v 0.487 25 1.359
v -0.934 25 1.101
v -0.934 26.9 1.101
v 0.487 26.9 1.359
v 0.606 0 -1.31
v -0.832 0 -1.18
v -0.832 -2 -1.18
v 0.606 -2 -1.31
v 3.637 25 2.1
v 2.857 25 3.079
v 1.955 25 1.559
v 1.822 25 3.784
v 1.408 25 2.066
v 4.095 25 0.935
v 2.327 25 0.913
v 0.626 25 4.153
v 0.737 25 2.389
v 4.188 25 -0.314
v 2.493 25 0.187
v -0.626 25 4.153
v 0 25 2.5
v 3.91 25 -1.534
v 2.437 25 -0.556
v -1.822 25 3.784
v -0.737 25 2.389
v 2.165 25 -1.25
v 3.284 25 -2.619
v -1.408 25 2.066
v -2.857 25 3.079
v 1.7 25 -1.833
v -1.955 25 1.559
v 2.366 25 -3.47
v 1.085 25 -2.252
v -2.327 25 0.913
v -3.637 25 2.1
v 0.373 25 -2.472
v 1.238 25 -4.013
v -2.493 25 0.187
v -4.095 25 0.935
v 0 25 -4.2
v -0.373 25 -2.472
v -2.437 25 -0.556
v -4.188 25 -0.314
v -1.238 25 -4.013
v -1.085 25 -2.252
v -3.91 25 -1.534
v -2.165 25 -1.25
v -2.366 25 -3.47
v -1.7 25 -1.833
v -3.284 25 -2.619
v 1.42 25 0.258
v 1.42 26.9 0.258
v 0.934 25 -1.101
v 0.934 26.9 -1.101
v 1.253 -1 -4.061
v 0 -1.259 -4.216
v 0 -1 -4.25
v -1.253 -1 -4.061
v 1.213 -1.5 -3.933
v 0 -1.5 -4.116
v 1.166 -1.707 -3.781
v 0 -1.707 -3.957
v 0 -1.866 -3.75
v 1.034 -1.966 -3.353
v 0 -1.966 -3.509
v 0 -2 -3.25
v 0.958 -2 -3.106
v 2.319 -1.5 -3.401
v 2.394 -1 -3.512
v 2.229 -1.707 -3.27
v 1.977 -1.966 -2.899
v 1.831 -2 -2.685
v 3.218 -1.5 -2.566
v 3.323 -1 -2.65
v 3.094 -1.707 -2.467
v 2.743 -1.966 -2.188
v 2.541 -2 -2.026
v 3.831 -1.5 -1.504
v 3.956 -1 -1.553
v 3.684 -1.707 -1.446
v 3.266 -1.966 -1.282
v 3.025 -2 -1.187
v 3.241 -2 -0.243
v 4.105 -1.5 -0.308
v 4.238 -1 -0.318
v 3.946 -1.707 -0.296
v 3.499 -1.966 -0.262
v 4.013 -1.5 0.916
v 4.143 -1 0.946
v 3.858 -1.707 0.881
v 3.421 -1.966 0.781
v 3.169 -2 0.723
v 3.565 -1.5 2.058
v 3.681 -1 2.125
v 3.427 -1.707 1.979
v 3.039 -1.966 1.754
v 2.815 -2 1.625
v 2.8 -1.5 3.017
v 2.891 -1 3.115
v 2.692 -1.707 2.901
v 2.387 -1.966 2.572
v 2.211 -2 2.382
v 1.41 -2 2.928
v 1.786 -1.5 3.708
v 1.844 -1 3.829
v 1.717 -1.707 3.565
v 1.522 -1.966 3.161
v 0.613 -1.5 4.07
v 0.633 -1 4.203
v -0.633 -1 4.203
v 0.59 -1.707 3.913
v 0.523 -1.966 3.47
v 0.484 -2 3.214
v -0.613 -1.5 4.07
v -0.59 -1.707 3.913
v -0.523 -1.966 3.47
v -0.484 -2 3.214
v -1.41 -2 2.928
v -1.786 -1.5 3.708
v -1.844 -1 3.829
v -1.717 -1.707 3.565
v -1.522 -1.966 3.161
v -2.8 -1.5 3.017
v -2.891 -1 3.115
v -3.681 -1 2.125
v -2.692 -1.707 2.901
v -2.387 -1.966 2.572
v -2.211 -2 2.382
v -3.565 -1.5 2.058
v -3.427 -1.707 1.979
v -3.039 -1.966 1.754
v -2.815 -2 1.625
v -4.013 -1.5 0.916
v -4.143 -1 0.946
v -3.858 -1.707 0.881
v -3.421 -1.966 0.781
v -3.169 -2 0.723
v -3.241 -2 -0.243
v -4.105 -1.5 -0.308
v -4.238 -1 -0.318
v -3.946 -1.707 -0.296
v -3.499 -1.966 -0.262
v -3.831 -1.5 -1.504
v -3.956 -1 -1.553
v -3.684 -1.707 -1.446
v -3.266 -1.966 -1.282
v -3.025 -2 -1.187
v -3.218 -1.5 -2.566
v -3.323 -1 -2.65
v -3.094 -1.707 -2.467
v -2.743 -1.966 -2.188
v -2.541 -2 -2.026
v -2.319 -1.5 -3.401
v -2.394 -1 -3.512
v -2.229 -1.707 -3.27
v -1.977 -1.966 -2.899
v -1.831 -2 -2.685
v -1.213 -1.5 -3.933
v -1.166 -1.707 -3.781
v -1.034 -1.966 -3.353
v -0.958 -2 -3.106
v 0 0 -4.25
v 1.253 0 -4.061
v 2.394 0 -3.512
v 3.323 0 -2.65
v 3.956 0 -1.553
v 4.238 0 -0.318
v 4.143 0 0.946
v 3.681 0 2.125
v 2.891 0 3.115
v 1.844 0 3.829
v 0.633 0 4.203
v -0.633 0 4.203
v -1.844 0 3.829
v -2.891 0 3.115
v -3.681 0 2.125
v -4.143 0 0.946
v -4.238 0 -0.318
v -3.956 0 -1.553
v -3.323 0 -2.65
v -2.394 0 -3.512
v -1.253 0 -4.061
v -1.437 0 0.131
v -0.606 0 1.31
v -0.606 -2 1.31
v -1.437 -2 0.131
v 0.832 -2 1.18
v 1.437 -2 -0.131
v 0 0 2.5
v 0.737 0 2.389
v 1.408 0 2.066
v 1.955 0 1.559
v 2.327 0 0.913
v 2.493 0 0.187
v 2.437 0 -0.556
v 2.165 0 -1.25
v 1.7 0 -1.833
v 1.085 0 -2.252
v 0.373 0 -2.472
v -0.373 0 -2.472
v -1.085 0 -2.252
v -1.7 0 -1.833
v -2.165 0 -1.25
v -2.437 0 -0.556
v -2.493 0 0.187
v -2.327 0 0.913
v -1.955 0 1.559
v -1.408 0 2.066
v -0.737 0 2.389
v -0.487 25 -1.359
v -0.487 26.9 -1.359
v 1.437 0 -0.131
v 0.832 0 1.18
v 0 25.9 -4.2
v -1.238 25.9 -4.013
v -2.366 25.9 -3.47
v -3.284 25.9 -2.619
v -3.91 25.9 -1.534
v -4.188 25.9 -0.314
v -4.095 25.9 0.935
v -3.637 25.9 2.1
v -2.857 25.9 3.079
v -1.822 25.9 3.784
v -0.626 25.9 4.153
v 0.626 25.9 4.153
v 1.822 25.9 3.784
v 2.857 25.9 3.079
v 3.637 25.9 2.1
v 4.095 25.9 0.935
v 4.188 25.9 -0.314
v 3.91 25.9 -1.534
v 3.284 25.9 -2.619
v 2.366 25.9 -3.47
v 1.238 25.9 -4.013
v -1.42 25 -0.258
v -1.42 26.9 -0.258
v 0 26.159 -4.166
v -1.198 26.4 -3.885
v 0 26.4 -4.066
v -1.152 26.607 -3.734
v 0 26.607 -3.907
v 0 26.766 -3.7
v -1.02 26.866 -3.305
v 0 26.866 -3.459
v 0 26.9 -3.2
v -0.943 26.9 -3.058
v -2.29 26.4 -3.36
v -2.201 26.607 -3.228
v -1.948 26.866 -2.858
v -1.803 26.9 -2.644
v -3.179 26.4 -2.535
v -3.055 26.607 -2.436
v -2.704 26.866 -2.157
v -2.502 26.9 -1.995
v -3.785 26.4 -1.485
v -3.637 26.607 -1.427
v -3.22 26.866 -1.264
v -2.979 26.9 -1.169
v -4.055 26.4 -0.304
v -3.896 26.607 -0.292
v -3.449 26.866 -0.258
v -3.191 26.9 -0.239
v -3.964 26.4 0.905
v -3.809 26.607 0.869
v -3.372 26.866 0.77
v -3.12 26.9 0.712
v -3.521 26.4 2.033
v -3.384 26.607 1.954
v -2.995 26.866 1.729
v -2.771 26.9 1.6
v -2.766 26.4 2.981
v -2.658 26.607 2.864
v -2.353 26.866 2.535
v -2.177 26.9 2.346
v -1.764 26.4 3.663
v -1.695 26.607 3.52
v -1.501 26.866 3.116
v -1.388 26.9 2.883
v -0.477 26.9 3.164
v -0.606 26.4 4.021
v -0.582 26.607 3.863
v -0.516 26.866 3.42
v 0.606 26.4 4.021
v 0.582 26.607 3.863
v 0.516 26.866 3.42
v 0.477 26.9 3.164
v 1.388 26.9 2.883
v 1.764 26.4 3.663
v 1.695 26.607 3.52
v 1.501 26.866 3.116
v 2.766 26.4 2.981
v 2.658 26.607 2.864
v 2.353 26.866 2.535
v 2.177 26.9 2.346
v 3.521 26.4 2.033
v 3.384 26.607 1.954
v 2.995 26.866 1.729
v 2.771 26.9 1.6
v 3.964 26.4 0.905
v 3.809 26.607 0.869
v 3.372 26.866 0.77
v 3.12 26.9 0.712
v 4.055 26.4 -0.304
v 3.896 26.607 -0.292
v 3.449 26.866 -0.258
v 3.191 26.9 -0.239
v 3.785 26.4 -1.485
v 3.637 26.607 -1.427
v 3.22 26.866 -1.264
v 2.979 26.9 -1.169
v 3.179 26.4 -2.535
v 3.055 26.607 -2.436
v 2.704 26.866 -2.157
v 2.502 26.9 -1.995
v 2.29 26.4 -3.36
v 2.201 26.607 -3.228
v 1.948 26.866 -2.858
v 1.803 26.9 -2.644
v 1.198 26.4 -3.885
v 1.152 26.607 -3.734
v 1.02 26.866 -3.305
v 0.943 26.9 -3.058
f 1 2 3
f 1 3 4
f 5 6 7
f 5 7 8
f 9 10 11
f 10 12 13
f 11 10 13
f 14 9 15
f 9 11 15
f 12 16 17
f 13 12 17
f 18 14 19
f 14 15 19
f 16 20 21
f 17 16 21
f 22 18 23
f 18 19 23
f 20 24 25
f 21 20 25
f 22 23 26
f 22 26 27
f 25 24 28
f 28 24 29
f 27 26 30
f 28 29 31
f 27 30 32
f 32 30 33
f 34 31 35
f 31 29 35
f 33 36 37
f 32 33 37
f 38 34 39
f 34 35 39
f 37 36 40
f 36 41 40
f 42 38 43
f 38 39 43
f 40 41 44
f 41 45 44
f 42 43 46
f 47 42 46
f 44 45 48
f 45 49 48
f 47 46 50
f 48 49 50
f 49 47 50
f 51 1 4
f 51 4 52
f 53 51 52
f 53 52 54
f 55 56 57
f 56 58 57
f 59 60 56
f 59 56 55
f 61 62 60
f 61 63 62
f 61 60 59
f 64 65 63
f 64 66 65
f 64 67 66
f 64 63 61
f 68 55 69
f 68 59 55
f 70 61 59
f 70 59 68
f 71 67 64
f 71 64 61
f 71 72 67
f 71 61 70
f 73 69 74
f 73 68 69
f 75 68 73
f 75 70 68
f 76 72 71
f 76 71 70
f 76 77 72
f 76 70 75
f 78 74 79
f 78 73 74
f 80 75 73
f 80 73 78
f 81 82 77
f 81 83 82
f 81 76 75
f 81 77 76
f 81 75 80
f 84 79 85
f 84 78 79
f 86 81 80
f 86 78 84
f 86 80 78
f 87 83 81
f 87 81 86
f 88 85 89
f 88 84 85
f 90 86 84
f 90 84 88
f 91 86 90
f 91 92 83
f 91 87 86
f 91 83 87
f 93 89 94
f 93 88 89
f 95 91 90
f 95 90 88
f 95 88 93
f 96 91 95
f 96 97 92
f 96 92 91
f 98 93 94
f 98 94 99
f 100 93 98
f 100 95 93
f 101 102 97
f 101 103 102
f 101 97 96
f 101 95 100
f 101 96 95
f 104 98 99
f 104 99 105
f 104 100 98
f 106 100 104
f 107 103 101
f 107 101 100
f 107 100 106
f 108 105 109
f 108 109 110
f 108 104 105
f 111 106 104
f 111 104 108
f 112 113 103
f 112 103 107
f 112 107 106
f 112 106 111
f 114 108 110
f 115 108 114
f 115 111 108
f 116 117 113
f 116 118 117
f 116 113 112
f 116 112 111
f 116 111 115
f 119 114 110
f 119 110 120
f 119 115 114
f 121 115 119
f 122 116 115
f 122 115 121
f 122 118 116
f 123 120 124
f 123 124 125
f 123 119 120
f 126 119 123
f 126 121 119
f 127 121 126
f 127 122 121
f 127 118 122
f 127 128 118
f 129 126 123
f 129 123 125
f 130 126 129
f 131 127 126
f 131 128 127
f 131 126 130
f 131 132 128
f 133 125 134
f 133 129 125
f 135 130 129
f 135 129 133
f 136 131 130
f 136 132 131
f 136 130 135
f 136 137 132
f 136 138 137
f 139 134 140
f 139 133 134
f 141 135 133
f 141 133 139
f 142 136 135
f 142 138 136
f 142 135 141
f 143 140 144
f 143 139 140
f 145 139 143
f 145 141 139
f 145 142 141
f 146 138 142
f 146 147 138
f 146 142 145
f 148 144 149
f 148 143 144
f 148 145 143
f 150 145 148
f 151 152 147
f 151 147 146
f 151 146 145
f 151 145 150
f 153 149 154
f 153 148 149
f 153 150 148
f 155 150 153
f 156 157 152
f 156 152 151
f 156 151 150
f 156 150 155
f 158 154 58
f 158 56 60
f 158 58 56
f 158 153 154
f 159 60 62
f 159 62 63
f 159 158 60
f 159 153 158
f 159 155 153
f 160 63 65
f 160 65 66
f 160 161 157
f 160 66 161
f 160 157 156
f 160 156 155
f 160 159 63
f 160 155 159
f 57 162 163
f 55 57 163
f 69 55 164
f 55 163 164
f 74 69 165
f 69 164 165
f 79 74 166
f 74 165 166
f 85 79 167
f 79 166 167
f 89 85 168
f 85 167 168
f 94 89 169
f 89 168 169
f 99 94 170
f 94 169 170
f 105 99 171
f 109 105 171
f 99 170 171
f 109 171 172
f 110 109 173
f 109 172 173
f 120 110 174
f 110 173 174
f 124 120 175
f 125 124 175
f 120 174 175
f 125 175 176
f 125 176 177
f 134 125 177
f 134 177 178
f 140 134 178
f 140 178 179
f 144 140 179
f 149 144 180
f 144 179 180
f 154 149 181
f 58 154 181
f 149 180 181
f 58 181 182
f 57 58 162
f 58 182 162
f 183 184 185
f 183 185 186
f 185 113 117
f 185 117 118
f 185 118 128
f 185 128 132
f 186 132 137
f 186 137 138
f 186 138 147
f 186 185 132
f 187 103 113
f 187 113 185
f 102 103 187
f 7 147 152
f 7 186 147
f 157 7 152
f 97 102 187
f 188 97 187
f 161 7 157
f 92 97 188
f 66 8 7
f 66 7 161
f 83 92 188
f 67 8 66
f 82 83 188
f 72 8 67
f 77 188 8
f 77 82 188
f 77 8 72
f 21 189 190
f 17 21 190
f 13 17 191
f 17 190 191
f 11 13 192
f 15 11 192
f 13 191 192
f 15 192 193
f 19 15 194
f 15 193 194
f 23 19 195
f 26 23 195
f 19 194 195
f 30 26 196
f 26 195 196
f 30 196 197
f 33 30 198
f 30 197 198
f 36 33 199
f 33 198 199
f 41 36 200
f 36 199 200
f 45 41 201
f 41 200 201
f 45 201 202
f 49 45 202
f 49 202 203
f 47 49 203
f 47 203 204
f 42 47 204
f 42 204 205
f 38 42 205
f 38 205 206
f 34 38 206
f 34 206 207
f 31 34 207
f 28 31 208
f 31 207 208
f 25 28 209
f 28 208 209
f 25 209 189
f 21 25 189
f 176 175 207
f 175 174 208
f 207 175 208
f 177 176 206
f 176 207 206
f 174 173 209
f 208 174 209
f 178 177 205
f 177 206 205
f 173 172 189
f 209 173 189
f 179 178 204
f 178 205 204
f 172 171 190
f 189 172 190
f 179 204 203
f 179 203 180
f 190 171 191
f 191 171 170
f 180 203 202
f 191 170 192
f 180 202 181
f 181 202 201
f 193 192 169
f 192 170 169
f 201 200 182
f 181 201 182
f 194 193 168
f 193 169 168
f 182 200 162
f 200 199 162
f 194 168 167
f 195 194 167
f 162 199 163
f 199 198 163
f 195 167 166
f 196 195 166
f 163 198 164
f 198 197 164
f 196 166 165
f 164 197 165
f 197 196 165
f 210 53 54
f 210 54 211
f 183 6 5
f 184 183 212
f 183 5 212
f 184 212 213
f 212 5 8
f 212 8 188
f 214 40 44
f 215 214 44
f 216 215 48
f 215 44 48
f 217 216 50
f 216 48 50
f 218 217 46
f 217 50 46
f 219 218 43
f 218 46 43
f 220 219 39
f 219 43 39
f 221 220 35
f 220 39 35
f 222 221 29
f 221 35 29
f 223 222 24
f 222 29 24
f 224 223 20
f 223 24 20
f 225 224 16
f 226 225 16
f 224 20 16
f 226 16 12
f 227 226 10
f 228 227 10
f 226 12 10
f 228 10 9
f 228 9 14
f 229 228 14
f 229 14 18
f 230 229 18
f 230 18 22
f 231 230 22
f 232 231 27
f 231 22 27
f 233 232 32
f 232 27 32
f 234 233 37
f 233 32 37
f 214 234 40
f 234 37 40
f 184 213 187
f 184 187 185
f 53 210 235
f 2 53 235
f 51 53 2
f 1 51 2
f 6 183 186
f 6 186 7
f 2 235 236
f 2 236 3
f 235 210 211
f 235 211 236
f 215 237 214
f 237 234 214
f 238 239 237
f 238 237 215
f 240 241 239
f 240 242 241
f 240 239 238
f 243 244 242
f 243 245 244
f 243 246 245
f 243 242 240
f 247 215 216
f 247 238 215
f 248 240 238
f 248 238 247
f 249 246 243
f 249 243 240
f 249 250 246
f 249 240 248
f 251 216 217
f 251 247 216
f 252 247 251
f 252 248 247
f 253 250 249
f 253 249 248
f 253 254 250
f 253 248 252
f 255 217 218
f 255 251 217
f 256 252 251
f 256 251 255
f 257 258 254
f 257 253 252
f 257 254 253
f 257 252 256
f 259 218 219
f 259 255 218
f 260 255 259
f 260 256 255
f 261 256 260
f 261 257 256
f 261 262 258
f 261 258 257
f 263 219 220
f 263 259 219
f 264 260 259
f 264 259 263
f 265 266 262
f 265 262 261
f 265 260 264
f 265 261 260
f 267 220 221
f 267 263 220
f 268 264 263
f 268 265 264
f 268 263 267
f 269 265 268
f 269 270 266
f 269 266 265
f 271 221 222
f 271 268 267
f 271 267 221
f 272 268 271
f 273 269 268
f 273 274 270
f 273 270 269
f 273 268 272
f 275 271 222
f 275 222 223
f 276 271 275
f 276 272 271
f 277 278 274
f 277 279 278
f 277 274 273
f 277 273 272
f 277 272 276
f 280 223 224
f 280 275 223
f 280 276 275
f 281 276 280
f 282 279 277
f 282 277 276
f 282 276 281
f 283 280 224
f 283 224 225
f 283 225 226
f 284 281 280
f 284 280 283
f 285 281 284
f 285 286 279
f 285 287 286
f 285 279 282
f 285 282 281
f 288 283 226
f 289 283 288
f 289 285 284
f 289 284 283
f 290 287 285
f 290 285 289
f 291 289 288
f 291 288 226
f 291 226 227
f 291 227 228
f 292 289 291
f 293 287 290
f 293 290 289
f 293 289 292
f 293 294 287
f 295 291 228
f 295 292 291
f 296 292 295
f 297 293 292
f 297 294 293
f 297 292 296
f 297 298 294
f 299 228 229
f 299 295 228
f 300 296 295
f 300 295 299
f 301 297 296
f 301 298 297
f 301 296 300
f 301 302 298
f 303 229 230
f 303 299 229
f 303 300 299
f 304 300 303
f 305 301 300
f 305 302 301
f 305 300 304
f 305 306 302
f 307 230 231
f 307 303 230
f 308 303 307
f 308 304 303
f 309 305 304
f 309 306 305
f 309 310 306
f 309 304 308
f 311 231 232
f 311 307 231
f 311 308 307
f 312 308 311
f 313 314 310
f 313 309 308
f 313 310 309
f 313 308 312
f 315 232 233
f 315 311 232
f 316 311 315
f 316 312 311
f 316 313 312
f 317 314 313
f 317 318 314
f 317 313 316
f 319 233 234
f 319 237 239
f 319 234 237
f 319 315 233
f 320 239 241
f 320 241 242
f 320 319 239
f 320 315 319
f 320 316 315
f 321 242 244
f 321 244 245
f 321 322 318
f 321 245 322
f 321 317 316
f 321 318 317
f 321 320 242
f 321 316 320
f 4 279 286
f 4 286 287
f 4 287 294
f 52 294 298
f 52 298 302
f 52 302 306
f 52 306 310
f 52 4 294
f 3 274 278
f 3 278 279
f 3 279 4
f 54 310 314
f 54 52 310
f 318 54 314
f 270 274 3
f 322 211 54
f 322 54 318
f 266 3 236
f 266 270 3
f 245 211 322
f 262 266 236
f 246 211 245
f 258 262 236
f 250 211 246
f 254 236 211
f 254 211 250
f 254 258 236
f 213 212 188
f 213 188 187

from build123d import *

# Parameters (mm, degrees)
SKETCH_1_R      = 2.5
EXTRUDE_1_DEPTH = 25
SKETCH_2_R      = 4.2
EXTRUDE_2_DEPTH = 1.9
SKETCH_3_R      = 4.25
EXTRUDE_3_DEPTH = 2
FILLET_1_R      = 1


with BuildPart() as part:
    # 草图1 → 凸台-拉伸1 (new body)
    with BuildSketch(Plane(origin=(0, 0, 0), x_dir=(1, 0, 0), z_dir=(0, 1, 0))):
        with Locations(Location((0, 0, 0), (0, 0, 270))):
            Circle(SKETCH_1_R)
    extrude(amount=EXTRUDE_1_DEPTH)

    # 草图2 → 凸台-拉伸2 (add)
    with BuildSketch(Plane(origin=(0, 25, 0), x_dir=(1, 0, 0), z_dir=(0, 1, 0))):
        with Locations(Location((0, 0, 0), (0, 0, 90))):
            Circle(SKETCH_2_R)
        Polygon((0.933529185, 1.100843583), (-0.486593916, 1.358881781), (-1.420123101, 0.258038198), (-0.933529185, -1.100843583), (0.486593916, -1.358881781), (1.420123101, -0.258038198), align=None, mode=Mode.SUBTRACT)
    extrude(amount=EXTRUDE_2_DEPTH)

    # 草图3 → 凸台-拉伸3 (add)
    with BuildSketch(Plane.XZ):
        with Locations(Location((0, 0, 0), (0, 0, 270))):
            Circle(SKETCH_3_R)
        Polygon((0.831789315, 1.179601572), (-0.605670271, 1.310151463), (-1.437459585, 0.130549891), (-0.831789315, -1.179601572), (0.605670271, -1.310151463), (1.437459585, -0.130549891), align=None, mode=Mode.SUBTRACT)
    extrude(amount=EXTRUDE_3_DEPTH)

    # 圆角1
    fillet_1_edges = [part.edges().sort_by_distance(p)[0] for p in [
        (0, 26.9, 4.2),
        (0, -2, 4.25),
    ]]
    fillet(fillet_1_edges, radius=FILLET_1_R)


solid = part.part
